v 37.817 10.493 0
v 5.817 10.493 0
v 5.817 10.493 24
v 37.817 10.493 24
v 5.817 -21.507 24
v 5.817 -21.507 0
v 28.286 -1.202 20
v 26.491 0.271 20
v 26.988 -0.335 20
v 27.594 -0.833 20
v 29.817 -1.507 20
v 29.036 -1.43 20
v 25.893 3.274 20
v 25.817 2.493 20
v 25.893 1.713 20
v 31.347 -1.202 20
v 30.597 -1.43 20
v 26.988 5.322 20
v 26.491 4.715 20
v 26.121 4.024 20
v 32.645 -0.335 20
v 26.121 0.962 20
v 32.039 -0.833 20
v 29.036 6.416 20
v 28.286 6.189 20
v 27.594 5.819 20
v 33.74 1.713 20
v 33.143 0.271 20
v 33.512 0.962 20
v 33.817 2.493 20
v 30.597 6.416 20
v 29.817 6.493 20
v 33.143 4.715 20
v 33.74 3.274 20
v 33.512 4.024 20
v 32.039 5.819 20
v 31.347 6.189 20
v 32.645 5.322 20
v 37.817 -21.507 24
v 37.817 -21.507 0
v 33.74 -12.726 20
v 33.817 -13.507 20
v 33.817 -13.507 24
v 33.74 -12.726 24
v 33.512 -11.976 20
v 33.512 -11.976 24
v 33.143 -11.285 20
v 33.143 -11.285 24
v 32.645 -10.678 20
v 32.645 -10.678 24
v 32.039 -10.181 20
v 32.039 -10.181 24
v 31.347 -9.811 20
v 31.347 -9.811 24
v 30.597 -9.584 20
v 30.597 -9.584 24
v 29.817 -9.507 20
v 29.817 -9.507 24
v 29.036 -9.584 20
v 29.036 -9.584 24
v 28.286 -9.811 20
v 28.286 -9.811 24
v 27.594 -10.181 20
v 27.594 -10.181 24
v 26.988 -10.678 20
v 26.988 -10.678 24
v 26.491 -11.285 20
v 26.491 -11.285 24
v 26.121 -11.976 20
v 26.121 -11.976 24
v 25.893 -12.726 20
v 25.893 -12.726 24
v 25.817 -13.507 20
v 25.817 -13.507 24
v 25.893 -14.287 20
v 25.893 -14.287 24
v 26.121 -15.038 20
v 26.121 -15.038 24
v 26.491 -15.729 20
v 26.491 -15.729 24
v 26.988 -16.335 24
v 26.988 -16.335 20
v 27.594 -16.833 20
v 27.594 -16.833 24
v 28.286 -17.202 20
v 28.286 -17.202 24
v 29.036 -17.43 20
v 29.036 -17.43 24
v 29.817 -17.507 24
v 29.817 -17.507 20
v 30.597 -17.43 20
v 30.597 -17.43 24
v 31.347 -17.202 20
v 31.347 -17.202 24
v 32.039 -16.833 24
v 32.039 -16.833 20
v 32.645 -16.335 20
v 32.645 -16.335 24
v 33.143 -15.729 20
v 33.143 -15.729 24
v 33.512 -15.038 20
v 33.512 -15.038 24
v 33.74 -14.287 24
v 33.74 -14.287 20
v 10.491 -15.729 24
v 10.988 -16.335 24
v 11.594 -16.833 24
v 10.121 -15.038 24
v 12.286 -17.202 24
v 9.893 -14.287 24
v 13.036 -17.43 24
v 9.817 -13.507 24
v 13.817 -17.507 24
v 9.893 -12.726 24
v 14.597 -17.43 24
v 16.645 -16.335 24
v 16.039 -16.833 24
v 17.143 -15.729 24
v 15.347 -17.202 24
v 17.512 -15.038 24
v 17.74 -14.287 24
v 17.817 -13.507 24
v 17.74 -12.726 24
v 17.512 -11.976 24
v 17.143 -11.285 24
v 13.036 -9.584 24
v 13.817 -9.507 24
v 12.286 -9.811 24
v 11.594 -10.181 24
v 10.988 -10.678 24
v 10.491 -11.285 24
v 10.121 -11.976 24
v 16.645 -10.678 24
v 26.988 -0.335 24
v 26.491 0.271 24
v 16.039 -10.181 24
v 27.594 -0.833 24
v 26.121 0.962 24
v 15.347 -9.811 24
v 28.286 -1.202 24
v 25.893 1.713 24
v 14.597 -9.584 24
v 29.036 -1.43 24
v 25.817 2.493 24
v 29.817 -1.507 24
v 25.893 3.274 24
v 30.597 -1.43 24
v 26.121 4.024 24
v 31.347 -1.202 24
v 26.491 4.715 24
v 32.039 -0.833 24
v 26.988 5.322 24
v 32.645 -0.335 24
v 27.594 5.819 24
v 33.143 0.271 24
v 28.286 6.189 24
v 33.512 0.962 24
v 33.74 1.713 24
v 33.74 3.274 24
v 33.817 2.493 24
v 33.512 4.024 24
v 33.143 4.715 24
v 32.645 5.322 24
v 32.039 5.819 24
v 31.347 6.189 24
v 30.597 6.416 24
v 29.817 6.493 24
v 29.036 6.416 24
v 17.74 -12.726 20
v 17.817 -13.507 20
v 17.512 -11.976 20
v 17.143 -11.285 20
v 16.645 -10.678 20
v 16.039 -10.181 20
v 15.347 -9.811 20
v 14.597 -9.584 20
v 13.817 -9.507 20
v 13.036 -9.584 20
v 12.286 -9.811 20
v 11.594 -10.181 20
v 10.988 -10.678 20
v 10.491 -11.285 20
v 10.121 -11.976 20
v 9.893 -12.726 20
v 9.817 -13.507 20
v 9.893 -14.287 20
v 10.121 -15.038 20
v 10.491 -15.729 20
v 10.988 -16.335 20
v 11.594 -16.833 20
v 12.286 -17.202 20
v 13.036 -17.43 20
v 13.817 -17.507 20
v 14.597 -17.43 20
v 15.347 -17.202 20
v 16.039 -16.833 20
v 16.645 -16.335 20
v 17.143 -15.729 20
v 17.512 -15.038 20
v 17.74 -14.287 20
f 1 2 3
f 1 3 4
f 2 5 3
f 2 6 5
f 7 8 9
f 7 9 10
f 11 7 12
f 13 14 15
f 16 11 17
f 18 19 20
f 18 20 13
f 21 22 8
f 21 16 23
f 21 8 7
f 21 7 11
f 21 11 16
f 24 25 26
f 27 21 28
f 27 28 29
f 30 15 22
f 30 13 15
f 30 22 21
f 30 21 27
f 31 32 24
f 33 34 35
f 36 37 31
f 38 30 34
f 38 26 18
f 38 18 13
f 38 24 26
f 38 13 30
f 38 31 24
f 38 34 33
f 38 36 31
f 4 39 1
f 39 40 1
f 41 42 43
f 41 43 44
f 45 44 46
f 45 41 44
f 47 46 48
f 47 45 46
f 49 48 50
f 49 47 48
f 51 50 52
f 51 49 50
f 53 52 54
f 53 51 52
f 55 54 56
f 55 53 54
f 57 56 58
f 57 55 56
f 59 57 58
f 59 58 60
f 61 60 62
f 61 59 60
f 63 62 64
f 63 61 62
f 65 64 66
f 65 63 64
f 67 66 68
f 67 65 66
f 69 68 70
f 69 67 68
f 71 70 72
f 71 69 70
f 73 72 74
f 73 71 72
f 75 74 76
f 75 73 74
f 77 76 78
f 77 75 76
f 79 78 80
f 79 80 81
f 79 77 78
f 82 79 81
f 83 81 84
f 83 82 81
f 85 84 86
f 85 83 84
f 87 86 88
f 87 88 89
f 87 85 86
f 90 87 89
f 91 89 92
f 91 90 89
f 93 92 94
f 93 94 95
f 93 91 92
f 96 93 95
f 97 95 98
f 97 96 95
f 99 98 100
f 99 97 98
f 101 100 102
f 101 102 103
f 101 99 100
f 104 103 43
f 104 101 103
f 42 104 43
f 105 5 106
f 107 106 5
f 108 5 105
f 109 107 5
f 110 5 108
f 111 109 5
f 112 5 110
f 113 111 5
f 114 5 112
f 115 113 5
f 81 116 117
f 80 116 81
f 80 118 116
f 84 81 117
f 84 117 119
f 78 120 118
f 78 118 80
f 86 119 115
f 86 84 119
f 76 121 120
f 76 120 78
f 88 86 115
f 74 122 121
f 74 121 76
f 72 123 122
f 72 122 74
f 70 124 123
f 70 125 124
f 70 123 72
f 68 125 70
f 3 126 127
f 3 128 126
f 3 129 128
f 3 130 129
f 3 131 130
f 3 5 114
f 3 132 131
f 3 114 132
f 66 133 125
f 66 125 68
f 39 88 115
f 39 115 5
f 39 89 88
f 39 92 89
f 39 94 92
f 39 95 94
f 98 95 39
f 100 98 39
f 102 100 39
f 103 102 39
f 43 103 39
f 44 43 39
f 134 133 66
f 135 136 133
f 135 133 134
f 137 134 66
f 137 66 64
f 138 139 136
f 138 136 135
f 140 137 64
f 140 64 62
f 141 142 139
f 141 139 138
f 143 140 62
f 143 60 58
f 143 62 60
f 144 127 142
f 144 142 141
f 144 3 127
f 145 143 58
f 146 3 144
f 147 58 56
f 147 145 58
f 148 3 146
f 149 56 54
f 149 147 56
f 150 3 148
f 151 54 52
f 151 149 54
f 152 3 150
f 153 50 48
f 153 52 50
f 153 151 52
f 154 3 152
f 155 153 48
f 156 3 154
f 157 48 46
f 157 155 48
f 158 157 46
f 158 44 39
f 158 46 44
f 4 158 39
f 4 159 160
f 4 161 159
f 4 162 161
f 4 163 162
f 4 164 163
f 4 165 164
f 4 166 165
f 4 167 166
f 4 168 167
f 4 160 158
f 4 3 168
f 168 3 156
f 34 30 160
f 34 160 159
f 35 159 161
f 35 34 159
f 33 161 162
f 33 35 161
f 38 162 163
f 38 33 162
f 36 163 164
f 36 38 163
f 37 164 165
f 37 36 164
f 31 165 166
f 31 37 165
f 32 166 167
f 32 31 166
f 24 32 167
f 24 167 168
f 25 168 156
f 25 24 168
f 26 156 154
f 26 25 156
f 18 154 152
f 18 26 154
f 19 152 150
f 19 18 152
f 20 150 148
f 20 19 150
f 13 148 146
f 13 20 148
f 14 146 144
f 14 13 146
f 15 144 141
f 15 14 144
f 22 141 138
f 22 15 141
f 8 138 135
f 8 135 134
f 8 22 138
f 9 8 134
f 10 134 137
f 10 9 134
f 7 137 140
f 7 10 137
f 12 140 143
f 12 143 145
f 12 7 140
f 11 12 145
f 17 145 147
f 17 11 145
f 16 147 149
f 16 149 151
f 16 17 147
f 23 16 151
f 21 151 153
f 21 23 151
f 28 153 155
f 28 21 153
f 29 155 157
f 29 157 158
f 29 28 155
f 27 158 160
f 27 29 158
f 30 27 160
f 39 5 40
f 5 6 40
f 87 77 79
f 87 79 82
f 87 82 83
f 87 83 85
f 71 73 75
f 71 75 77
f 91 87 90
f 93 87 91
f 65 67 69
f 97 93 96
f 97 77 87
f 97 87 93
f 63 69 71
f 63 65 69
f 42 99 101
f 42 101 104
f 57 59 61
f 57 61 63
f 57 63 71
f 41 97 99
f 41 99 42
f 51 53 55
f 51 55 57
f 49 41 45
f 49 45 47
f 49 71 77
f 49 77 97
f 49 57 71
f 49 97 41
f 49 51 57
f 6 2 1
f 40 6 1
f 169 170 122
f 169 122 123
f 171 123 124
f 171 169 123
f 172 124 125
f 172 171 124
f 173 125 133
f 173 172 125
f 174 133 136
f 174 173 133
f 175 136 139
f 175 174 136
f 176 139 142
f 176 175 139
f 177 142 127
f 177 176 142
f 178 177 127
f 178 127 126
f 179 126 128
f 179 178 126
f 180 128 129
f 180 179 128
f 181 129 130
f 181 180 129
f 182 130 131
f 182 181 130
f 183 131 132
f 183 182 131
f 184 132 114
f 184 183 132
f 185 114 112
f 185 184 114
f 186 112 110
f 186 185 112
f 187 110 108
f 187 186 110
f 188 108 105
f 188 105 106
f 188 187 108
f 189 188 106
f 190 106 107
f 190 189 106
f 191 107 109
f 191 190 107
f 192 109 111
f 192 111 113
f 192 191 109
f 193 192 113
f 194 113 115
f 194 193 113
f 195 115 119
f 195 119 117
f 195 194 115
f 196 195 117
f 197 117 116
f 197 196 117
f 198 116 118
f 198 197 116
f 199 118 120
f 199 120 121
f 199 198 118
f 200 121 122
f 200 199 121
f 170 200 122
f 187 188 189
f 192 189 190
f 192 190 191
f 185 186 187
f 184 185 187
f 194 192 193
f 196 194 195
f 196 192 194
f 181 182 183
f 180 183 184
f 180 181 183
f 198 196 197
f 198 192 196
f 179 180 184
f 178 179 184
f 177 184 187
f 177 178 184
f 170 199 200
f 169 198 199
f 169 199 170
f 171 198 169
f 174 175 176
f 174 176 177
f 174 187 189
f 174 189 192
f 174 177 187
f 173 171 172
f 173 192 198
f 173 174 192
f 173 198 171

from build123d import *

# Parameters (mm, degrees)
F0_W     = 32
F0_H     = 32
F1_DEPTH = 20
F4_W     = 32
F4_H     = 32
F4_R     = 4
F5_DEPTH = 4


# Not quite as in the source:
# - the program builds the solid bodies; features that only make, move or delete a surface that nothing else refers to are left out


with BuildPart() as f1:
    # F0 (on Top) → F1 (new body)
    with BuildSketch(Plane.XY):
        with Locations((21.8166250885, -5.5067900717)):
            Rectangle(F0_W, F0_H)
    extrude(amount=F1_DEPTH)

    # F4 (on face) → F5 (join)
    with BuildSketch(Plane.XY.offset(20)):
        with Locations((21.8166250885, -5.5067900717)):
            Rectangle(F4_W, F4_H)
        with Locations((13.8166250885, -13.5067900717)):
            Circle(F4_R, mode=Mode.SUBTRACT)
        with Locations((29.8166250885, -13.5067900717)):
            Circle(F4_R, mode=Mode.SUBTRACT)
        with Locations((29.8166250885, 2.4932099283)):
            Circle(F4_R, mode=Mode.SUBTRACT)
    extrude(amount=F5_DEPTH)


solid = f1.part
